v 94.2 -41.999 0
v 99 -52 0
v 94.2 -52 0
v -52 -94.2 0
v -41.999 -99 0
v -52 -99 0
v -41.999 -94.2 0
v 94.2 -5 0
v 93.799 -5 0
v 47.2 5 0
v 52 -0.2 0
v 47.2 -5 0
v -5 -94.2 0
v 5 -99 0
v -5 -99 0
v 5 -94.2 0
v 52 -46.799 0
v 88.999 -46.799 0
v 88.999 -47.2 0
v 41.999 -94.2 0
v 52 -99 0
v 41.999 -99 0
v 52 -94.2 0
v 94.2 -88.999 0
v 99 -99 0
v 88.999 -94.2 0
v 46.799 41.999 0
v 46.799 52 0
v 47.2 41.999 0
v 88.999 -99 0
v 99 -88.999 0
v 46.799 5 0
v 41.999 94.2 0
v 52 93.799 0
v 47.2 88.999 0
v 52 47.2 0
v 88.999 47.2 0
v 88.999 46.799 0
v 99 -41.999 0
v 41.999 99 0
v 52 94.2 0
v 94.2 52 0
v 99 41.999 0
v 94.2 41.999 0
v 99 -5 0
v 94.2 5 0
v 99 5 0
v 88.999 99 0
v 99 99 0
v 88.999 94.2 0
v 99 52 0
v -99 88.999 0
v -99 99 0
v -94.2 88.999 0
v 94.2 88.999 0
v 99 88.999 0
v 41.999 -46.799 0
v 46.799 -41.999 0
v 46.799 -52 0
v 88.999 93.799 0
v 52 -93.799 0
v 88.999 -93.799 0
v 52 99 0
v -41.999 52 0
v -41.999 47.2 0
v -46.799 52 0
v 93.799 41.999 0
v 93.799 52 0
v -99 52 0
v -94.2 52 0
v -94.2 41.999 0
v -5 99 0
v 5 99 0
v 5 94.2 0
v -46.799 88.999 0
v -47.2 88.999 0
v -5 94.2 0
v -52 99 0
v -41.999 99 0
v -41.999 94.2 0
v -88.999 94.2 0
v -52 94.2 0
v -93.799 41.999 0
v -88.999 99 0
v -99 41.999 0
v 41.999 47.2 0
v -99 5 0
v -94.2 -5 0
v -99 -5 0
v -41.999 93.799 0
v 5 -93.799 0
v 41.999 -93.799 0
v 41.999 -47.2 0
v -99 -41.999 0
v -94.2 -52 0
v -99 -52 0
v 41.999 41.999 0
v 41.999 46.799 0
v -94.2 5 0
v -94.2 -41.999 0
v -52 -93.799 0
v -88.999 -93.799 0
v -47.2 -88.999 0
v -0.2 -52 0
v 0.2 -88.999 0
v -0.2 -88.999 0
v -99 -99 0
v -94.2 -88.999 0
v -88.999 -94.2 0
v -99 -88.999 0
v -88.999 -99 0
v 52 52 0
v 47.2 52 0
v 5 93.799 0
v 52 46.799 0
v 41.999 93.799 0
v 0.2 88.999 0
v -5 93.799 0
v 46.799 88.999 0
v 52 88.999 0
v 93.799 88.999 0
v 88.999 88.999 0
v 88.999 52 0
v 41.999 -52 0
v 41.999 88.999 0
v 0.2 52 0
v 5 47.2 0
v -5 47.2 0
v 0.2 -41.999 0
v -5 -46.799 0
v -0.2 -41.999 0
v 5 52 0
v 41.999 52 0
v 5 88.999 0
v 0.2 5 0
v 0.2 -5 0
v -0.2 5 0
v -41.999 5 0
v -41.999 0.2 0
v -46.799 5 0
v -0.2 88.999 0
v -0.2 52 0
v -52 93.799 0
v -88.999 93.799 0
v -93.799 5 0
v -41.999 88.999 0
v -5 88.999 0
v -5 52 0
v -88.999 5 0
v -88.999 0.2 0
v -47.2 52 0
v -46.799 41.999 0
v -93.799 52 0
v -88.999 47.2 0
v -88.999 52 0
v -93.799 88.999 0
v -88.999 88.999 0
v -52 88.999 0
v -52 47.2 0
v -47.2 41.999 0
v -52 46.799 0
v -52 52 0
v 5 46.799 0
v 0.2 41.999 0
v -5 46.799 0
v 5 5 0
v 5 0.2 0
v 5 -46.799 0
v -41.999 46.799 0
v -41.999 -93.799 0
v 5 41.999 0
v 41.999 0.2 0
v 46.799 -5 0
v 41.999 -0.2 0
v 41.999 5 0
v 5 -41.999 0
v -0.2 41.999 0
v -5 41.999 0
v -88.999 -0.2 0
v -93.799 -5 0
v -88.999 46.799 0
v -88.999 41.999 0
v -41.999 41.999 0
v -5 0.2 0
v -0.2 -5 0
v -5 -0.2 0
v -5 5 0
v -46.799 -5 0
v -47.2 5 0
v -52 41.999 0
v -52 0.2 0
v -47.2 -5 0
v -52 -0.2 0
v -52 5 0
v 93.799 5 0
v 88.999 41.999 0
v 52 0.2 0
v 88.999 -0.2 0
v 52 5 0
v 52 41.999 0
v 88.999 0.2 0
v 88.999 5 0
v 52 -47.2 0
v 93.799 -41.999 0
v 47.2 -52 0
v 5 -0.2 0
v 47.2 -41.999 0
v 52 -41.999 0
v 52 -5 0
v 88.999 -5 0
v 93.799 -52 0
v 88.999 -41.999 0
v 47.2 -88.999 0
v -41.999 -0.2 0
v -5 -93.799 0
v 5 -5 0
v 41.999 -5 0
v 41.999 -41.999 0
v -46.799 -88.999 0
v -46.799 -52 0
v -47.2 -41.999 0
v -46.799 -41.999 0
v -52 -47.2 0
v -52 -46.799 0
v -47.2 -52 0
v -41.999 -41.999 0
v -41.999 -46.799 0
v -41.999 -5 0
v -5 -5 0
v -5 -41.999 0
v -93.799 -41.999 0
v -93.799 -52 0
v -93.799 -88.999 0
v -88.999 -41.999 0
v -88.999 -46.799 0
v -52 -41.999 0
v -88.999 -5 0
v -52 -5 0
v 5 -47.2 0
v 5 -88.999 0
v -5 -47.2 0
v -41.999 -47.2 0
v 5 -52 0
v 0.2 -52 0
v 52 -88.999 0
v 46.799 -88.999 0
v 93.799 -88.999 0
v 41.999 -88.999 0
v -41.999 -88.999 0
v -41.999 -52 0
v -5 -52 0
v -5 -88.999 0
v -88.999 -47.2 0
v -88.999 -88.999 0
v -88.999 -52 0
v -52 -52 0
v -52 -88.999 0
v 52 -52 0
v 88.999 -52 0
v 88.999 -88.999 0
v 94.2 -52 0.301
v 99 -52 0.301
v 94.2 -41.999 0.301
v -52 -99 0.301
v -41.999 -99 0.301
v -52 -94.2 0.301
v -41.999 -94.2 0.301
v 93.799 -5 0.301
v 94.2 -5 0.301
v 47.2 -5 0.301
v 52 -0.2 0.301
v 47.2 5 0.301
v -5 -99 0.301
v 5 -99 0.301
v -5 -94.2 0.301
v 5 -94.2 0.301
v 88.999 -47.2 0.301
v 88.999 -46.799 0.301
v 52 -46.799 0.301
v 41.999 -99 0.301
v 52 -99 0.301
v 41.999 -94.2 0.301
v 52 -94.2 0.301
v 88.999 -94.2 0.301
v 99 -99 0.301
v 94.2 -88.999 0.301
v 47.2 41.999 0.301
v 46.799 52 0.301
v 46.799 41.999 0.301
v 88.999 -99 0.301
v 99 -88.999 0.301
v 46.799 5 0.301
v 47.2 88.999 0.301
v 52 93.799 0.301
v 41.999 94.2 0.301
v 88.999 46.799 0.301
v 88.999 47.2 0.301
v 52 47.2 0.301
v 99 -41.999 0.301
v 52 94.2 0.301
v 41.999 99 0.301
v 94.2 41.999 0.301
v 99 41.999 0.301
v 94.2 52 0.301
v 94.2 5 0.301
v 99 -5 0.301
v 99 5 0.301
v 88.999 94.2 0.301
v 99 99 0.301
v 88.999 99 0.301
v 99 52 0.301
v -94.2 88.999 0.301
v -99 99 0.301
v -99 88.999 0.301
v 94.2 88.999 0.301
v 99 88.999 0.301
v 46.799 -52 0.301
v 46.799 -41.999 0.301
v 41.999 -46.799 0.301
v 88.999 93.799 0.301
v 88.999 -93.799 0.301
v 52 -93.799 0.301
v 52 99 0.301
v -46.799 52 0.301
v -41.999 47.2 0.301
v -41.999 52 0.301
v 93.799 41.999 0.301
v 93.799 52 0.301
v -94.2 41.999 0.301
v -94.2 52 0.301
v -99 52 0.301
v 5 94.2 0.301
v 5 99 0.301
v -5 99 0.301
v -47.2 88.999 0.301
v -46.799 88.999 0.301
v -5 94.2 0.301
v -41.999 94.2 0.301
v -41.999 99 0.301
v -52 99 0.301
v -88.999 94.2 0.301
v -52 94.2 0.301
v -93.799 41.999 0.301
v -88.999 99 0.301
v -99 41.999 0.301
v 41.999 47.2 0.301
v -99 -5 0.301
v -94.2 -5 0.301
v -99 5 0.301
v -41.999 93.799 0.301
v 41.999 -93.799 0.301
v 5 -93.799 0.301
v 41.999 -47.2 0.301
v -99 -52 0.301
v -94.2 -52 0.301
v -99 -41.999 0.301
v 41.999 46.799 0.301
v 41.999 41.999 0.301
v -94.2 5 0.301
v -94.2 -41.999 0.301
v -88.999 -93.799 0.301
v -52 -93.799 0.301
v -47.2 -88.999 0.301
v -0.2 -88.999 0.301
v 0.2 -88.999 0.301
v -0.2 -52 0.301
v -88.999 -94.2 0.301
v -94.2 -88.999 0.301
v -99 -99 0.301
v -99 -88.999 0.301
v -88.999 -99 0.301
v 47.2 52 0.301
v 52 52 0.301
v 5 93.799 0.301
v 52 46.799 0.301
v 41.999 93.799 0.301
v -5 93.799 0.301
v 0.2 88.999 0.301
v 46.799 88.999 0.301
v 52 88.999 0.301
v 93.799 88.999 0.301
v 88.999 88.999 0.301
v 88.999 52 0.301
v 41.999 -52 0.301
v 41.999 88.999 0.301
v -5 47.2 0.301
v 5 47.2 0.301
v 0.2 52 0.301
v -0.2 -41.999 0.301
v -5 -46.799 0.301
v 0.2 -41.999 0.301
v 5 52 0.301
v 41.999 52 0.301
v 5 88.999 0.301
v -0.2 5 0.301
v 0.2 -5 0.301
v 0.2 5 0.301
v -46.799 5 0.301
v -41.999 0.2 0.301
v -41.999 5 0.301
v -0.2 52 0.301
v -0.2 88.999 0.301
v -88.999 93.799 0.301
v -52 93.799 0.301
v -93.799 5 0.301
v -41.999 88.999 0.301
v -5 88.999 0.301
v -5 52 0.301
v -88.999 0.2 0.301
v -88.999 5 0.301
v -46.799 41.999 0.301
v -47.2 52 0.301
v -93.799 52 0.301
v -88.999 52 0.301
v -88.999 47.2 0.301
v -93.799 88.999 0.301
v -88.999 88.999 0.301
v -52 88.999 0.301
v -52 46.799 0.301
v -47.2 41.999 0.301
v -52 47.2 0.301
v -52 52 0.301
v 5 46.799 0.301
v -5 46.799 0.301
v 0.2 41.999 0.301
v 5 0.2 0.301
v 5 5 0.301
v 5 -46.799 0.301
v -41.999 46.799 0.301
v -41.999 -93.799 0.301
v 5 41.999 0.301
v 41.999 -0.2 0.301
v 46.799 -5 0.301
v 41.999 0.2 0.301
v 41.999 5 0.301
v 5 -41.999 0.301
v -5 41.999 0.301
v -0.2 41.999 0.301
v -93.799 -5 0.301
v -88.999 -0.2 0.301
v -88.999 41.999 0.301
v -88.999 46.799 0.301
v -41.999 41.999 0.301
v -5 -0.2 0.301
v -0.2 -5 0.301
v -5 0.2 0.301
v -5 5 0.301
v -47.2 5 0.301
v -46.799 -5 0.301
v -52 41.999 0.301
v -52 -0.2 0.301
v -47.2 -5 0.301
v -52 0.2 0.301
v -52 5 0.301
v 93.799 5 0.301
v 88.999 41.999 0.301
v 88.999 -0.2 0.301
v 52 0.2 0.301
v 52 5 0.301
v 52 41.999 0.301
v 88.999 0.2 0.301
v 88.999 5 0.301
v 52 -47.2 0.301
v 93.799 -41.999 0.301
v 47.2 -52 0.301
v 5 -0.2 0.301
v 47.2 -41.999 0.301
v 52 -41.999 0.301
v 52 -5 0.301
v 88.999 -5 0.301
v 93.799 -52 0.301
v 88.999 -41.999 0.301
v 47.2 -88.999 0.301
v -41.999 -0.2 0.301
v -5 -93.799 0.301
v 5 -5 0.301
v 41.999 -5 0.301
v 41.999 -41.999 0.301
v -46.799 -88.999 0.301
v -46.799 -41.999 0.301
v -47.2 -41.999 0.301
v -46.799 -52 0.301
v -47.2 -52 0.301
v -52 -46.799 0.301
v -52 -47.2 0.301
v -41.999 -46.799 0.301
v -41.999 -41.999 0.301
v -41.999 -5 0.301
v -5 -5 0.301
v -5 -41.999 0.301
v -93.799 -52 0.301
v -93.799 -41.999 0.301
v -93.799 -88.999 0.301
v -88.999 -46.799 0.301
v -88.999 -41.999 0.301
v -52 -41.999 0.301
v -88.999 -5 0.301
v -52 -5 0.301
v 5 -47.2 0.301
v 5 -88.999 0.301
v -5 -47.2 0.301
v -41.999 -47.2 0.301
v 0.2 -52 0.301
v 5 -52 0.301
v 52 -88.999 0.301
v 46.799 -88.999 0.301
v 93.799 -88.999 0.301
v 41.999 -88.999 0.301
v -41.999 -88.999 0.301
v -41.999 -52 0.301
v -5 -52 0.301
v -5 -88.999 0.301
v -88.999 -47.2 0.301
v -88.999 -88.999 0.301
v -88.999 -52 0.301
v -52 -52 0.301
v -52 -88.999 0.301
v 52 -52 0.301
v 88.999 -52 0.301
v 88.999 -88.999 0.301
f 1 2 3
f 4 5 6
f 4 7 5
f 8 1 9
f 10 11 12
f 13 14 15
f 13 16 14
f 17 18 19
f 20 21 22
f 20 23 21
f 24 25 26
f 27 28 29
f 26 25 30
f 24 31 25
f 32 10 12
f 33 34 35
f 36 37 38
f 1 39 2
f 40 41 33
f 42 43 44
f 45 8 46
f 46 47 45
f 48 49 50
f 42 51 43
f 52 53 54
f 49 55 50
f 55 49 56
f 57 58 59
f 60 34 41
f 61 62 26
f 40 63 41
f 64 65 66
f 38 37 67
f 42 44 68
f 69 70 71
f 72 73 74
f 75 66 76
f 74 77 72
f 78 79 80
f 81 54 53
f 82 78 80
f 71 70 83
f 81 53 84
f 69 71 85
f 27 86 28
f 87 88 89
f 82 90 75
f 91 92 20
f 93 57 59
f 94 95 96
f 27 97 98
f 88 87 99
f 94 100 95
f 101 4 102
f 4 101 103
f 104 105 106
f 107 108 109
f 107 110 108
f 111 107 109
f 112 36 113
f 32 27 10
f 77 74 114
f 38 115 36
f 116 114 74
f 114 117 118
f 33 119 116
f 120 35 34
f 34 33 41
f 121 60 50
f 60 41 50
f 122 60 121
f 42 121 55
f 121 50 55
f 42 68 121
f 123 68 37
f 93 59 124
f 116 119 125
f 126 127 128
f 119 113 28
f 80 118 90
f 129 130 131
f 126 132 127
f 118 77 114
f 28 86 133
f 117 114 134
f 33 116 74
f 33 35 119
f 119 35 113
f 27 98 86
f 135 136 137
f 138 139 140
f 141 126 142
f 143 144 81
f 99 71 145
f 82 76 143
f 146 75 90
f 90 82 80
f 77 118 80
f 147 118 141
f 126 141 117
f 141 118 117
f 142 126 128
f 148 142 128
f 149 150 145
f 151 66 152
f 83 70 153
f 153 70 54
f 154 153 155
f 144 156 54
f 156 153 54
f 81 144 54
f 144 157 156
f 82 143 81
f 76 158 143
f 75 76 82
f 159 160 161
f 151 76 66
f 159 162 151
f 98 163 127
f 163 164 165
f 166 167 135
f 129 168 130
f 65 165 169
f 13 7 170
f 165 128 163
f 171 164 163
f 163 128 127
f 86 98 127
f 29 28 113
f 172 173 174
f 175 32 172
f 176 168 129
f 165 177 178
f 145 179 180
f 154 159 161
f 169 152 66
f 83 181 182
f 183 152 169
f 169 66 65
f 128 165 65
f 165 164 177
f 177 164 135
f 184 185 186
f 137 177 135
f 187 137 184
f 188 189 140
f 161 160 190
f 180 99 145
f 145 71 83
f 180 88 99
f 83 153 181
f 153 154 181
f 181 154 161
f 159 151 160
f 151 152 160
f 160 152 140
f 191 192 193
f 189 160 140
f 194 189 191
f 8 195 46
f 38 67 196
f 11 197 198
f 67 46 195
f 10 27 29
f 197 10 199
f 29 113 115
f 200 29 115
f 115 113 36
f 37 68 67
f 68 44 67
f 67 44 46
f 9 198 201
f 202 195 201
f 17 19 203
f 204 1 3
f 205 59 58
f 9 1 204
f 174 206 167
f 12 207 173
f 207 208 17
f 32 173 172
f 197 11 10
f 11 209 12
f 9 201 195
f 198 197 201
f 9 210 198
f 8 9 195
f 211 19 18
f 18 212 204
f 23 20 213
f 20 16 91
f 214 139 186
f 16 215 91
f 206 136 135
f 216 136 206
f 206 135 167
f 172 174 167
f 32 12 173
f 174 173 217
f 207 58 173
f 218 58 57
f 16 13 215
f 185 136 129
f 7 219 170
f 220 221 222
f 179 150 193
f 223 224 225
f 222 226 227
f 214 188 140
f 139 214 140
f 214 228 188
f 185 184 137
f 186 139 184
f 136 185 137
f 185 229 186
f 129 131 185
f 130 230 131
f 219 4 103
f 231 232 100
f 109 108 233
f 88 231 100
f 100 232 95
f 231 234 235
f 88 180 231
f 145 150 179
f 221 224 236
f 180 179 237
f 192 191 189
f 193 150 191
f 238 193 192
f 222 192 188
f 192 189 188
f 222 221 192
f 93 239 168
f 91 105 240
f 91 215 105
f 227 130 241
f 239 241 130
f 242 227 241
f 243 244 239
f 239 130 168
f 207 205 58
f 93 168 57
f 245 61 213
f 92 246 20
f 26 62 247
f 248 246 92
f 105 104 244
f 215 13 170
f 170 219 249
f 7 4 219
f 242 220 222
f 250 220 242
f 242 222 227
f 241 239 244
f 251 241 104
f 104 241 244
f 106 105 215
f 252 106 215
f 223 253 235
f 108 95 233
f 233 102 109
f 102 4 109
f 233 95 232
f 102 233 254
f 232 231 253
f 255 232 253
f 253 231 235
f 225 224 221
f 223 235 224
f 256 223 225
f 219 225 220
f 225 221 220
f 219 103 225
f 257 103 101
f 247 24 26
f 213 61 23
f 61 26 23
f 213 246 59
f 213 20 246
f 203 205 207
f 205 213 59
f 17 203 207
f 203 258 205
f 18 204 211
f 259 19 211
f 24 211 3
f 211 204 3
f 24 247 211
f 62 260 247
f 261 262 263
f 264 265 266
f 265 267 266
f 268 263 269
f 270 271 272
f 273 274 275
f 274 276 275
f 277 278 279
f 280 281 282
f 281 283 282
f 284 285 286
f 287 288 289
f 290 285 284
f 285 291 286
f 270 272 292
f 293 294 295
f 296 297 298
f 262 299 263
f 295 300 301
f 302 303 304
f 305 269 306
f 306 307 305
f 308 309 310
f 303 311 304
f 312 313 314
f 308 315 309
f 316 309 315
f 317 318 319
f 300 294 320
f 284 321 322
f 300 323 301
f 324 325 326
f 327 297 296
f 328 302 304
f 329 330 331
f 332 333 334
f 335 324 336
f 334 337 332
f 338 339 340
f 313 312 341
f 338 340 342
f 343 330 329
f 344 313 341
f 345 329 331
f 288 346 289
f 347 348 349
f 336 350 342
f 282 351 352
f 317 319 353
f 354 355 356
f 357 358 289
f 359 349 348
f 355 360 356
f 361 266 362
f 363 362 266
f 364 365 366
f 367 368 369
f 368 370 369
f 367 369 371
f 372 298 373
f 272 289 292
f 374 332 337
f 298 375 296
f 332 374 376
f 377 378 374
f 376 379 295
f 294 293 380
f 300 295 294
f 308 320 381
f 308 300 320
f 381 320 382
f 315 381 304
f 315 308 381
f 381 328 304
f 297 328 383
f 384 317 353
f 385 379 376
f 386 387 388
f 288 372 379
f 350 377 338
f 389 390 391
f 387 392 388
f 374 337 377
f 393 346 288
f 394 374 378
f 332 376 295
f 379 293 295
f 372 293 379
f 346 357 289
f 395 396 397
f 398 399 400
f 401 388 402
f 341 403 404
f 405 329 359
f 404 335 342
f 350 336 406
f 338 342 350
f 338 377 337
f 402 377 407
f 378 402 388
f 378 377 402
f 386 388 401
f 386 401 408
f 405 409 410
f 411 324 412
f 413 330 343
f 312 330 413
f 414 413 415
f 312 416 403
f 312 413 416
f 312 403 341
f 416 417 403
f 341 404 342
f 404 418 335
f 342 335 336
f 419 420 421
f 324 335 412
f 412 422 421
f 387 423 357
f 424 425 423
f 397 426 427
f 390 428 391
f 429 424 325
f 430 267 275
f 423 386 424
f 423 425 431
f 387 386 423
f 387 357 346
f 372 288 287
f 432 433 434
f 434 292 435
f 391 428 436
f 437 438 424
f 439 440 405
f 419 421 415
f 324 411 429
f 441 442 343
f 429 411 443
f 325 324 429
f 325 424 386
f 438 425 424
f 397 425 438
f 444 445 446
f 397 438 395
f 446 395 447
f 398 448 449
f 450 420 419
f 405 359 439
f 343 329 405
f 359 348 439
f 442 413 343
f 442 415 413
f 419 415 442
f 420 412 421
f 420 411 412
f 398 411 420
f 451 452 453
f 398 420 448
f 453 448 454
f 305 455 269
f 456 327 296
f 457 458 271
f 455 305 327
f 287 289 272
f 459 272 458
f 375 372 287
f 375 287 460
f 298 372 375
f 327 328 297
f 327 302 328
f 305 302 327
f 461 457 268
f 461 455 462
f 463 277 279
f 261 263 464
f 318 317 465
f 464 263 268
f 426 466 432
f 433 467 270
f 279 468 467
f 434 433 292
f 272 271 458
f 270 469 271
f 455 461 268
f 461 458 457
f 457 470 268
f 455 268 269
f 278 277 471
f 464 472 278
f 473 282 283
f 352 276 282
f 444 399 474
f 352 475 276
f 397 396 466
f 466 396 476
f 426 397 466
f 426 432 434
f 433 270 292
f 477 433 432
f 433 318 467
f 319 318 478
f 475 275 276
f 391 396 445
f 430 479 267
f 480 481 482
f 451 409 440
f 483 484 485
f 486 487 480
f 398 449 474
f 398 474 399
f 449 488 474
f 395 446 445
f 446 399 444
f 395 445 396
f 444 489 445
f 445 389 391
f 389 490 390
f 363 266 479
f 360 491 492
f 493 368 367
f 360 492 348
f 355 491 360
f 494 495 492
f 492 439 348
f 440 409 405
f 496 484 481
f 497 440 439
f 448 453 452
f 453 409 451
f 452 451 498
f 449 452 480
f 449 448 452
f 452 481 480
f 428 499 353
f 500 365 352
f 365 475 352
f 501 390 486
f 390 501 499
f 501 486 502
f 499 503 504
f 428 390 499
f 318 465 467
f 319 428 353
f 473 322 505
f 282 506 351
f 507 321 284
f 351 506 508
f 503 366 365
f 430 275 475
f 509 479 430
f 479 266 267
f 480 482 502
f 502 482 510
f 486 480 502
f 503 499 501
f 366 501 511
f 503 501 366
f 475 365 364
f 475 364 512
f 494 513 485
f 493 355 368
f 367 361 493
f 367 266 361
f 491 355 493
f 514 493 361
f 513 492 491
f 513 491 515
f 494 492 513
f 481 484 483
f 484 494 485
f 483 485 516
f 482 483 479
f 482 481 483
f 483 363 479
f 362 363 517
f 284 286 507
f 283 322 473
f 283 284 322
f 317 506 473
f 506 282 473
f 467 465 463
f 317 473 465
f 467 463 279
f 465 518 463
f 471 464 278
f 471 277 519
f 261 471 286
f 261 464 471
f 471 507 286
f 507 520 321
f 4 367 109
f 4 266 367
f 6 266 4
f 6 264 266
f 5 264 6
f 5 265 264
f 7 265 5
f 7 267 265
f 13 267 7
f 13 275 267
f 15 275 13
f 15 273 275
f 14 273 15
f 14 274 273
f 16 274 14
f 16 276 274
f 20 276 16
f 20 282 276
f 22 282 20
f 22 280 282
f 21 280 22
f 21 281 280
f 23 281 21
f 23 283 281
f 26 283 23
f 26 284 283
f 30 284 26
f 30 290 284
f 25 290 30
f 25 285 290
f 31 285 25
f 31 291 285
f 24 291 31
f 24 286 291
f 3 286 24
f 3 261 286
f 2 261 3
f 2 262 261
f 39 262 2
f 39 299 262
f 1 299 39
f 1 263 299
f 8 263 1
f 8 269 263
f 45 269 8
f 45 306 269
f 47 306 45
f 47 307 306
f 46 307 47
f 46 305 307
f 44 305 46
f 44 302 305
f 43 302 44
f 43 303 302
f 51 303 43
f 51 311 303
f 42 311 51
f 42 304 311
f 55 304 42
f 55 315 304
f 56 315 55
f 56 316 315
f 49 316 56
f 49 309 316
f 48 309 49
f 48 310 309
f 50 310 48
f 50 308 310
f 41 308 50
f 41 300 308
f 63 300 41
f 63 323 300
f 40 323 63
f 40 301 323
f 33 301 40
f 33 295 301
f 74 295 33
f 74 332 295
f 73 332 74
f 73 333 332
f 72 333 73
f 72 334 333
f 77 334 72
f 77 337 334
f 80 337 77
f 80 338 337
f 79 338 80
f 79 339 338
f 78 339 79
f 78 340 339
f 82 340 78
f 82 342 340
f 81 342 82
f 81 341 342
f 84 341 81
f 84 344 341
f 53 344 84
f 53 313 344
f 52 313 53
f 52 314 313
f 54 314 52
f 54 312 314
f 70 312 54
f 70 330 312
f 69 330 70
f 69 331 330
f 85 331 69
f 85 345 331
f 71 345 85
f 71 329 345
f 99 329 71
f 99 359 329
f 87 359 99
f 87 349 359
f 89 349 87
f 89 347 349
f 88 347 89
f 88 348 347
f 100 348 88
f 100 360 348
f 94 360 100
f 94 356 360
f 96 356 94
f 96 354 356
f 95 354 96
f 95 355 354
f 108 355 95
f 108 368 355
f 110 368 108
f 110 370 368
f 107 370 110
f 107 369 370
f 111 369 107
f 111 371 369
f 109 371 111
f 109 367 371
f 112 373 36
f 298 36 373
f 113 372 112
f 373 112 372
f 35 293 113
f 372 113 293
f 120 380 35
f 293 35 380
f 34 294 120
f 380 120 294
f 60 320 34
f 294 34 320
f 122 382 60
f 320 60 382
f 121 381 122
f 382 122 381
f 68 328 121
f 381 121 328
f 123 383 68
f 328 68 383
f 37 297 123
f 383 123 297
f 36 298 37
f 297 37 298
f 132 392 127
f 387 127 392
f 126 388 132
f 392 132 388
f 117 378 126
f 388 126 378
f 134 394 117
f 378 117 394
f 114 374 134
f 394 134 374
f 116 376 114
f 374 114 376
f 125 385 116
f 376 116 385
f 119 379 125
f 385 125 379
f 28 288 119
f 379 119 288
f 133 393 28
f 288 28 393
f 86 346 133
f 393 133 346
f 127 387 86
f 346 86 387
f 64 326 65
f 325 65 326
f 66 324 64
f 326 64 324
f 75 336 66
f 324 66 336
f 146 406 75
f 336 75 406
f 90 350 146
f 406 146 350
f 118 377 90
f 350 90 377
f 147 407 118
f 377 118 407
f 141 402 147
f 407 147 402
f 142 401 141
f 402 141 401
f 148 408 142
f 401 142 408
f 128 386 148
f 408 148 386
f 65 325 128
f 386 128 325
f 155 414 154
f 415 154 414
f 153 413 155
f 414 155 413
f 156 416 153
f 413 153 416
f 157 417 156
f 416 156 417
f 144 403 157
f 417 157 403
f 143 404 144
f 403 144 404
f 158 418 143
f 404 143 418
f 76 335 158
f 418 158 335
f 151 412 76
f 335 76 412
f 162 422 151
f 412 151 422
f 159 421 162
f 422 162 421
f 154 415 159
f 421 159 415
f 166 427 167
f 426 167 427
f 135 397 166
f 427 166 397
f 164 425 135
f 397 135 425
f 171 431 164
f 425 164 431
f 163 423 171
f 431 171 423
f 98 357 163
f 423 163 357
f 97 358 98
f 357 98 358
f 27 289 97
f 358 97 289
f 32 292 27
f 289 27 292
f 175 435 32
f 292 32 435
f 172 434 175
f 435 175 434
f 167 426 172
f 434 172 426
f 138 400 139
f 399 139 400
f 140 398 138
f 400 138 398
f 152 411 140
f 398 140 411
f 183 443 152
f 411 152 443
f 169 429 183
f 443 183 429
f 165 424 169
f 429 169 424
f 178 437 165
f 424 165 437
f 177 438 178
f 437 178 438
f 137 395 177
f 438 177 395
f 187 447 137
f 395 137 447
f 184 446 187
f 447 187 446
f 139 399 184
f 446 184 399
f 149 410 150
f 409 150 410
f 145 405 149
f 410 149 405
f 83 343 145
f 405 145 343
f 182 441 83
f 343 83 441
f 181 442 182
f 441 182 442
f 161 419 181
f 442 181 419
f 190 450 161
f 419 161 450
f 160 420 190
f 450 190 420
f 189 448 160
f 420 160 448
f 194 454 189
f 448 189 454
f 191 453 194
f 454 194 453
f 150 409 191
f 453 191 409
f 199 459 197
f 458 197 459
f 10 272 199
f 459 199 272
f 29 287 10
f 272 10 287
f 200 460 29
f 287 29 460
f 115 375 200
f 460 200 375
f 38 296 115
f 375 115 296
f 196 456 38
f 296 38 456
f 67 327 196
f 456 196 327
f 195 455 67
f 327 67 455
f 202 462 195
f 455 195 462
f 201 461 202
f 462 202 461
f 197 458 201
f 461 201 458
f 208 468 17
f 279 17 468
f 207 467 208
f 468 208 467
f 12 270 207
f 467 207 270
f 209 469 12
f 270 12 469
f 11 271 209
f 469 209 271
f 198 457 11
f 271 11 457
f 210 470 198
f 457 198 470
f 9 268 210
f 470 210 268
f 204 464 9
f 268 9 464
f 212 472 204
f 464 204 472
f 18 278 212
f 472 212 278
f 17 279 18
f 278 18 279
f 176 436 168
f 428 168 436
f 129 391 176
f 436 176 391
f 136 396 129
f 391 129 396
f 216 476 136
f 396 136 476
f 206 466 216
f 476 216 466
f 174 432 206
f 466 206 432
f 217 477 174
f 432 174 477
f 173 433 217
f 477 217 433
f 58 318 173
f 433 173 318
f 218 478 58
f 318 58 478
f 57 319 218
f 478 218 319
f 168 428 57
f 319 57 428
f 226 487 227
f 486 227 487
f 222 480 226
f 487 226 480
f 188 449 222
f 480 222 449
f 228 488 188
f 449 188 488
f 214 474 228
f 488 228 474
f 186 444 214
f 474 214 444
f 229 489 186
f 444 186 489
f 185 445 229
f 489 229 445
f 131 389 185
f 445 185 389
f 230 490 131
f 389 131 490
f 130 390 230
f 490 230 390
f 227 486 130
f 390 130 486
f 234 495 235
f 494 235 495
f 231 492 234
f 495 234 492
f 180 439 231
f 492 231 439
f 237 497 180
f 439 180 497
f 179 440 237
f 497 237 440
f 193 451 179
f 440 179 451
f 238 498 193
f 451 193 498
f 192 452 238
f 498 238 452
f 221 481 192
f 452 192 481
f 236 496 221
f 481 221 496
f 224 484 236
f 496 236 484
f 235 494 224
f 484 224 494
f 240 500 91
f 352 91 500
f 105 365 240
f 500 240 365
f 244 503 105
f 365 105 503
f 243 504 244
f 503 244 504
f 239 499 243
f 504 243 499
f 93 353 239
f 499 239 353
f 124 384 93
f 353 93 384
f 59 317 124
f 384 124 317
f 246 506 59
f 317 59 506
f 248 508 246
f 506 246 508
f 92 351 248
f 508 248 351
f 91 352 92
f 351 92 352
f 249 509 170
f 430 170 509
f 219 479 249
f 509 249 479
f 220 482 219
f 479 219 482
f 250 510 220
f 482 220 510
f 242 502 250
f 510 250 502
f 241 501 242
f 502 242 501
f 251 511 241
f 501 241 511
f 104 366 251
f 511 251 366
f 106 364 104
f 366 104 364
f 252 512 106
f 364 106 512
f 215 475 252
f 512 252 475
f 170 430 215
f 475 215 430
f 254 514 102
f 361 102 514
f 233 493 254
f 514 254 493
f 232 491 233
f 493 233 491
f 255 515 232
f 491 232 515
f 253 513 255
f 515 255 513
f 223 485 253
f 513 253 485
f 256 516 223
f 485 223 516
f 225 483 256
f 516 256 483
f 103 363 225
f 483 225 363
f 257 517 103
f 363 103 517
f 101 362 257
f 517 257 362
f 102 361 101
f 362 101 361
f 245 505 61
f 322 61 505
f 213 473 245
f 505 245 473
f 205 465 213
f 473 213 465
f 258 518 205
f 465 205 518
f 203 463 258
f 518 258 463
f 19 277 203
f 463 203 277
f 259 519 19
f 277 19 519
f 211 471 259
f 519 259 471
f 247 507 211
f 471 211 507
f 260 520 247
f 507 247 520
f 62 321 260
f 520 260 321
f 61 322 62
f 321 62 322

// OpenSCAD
// Padded grid bed level pattern
// A 4 x 4 grid with a square pad at every intersection.

include <../../src/bedlevelpattern.scad>;

// Parameters
bed_level_pattern_type = "padded grid";
print_area_width = 220.001;
print_area_depth = 220.001;
line_width = 0.401;
line_height = 0.301;
fill_percentage = 90; // Range: [50:100]
grid_cell_count = 4;
grid_pad_size = 10.001;
quality_value = 128;

$fn = quality_value;

// Generate the pattern
generate_bed_level_pattern(
  bed_level_pattern_type, print_area_width, print_area_depth, line_width, line_height,
  fill_percentage, grid_cell_count=grid_cell_count, grid_pad_size=grid_pad_size
);
